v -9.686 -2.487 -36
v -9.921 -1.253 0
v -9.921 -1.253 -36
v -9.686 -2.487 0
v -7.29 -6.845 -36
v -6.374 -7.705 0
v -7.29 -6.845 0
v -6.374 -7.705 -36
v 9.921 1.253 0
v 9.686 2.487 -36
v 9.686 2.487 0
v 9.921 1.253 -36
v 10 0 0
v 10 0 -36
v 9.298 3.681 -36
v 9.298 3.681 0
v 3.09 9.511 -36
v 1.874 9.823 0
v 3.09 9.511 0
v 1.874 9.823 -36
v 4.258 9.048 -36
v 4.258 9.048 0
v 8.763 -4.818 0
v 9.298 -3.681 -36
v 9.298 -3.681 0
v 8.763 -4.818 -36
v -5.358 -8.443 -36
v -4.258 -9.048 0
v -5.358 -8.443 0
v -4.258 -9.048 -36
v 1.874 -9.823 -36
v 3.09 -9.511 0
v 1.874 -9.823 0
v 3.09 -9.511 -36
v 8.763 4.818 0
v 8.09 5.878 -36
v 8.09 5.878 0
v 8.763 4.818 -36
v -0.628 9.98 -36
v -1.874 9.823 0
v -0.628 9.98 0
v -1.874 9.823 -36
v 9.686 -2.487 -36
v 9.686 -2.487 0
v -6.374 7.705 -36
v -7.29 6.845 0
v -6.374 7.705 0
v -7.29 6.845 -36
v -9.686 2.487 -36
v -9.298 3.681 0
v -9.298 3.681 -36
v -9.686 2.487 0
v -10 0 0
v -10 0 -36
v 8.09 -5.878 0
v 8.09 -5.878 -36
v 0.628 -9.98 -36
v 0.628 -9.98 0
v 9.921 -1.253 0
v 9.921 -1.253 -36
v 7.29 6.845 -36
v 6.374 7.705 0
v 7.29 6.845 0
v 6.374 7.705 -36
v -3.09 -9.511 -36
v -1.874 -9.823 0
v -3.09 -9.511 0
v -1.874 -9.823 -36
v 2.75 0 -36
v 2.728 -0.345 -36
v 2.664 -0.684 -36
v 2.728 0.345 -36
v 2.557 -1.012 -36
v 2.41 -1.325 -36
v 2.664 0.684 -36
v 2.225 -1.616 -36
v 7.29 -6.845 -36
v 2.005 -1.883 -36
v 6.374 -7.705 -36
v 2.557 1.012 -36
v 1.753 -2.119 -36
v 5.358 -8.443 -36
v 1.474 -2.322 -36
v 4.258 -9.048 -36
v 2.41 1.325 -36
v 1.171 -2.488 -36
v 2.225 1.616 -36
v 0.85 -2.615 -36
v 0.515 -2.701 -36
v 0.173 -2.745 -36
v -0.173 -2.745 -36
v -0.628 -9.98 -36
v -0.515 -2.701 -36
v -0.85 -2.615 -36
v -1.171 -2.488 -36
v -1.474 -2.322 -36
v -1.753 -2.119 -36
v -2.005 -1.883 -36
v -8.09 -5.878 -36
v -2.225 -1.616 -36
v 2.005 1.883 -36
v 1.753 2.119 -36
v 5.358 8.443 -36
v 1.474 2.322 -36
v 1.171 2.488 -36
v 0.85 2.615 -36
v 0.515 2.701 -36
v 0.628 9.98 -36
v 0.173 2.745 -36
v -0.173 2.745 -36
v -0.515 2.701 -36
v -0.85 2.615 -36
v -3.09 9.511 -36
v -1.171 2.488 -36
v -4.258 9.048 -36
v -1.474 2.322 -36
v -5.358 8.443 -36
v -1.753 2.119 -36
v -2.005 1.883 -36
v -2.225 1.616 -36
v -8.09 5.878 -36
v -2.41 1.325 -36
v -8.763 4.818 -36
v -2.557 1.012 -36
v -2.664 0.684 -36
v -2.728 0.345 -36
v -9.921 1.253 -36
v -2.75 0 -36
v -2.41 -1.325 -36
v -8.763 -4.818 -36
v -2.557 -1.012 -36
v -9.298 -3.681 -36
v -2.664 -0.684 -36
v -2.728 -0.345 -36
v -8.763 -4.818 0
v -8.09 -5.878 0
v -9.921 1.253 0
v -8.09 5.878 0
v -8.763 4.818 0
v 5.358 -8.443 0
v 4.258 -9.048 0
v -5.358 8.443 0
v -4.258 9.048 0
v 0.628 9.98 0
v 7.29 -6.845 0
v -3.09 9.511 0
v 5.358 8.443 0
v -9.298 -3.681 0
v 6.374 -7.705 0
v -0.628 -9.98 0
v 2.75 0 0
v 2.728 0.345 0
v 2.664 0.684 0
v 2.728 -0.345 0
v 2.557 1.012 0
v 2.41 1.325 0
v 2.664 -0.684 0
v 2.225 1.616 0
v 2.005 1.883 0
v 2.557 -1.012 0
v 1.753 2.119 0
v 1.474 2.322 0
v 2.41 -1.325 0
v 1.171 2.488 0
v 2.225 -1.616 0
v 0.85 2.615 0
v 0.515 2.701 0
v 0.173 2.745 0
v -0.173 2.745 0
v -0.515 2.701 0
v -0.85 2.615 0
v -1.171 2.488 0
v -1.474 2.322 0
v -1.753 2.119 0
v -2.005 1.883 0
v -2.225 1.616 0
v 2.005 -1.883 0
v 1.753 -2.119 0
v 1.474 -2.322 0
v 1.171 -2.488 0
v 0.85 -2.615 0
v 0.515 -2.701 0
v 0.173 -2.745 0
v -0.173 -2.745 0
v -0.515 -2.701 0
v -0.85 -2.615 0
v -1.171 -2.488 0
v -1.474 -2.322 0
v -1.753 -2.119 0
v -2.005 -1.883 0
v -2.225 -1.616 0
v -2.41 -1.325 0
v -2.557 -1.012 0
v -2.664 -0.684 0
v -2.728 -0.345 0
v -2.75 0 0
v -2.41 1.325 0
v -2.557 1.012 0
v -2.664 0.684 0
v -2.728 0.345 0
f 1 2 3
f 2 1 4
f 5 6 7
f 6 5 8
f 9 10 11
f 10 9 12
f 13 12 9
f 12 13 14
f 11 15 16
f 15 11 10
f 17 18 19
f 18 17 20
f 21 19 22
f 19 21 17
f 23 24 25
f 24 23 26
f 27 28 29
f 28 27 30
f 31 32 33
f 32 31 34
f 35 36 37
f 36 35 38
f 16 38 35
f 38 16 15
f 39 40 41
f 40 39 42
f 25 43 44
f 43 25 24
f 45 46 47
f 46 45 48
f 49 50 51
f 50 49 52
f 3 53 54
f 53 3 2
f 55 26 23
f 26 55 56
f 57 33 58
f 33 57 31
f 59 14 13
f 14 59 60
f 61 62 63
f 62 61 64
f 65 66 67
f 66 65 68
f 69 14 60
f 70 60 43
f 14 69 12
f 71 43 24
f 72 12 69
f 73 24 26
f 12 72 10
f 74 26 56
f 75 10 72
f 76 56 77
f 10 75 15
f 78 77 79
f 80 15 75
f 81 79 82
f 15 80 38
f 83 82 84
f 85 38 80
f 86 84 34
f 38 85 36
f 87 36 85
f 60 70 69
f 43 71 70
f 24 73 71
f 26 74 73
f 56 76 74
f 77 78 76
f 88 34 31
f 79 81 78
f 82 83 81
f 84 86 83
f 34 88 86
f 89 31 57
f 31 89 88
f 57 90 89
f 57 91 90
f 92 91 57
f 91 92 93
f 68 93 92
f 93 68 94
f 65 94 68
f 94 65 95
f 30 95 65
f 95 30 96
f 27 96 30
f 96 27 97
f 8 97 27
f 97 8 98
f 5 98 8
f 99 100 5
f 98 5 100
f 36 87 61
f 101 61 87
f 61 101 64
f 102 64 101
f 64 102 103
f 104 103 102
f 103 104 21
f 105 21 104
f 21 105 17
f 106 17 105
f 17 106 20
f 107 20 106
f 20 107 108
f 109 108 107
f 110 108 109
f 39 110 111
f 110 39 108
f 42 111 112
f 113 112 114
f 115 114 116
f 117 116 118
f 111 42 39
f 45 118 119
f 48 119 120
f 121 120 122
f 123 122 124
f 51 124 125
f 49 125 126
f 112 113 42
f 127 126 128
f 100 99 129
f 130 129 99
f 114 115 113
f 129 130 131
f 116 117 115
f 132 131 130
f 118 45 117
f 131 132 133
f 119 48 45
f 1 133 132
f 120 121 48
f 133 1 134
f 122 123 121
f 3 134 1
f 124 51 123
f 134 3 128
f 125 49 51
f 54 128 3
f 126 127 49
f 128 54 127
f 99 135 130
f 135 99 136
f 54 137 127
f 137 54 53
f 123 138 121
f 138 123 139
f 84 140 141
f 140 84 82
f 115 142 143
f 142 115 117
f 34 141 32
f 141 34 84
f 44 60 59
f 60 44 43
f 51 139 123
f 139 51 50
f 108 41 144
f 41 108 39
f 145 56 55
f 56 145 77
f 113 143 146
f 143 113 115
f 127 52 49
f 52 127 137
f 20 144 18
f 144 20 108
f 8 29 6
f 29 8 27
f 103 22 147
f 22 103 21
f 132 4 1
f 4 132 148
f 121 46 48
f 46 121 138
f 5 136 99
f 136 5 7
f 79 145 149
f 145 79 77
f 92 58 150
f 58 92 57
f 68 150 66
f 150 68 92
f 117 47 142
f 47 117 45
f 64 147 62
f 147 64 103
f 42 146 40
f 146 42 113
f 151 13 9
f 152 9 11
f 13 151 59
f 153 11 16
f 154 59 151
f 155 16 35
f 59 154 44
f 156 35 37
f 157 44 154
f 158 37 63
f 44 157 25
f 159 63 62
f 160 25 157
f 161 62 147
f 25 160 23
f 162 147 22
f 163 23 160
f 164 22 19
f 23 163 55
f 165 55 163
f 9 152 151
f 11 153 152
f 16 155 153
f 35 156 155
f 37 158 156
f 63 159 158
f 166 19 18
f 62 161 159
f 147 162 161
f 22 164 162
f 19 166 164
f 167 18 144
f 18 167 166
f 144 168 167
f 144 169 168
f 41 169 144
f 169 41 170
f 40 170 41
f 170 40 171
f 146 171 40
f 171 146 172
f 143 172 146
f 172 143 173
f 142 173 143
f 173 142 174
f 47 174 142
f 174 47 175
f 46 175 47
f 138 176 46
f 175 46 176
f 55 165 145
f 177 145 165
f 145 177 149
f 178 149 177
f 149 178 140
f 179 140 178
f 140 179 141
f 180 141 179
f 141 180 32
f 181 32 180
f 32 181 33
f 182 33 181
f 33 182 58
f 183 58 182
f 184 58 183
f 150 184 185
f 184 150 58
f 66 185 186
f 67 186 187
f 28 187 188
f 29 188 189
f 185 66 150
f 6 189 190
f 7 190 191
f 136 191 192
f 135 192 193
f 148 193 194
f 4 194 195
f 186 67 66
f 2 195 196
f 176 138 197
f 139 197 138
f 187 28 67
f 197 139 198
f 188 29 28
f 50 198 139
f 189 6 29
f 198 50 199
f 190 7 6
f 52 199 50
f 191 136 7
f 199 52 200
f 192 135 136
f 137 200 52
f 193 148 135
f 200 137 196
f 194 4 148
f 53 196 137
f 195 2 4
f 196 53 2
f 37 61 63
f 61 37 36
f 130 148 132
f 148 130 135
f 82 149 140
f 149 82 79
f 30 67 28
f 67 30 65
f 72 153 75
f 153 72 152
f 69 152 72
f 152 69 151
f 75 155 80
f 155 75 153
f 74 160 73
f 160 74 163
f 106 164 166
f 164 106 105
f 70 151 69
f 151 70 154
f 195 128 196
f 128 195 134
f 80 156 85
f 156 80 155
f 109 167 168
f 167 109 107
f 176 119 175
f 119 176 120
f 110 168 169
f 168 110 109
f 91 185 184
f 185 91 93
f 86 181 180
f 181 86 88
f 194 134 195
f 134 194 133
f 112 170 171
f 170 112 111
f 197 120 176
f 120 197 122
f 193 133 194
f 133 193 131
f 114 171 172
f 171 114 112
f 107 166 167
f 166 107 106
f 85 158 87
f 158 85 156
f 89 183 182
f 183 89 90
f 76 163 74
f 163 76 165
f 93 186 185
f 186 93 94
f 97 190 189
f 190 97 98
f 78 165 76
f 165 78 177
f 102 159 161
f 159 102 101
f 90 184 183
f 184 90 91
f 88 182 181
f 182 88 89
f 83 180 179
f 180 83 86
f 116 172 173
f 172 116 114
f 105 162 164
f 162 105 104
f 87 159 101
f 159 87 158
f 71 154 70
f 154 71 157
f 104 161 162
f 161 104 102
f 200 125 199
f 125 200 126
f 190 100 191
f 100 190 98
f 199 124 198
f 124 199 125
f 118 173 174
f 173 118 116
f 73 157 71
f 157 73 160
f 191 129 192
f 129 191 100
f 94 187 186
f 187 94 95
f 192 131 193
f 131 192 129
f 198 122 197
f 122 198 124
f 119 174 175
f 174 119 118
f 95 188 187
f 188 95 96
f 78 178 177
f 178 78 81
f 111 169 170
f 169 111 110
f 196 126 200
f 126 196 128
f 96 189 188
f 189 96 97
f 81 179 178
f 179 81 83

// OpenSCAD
$fn = 50;


difference() {
	union() {
		translate(v = [0, 0, -36.0000000000]) {
			cylinder(h = 36, r = 10.0000000000);
		}
		cylinder(h = 0, r = 13.0000000000);
	}
	union() {
		#translate(v = [0, 0, -36]) {
			cylinder(h = 36, r = 2.7500000000);
		}
	}
}
